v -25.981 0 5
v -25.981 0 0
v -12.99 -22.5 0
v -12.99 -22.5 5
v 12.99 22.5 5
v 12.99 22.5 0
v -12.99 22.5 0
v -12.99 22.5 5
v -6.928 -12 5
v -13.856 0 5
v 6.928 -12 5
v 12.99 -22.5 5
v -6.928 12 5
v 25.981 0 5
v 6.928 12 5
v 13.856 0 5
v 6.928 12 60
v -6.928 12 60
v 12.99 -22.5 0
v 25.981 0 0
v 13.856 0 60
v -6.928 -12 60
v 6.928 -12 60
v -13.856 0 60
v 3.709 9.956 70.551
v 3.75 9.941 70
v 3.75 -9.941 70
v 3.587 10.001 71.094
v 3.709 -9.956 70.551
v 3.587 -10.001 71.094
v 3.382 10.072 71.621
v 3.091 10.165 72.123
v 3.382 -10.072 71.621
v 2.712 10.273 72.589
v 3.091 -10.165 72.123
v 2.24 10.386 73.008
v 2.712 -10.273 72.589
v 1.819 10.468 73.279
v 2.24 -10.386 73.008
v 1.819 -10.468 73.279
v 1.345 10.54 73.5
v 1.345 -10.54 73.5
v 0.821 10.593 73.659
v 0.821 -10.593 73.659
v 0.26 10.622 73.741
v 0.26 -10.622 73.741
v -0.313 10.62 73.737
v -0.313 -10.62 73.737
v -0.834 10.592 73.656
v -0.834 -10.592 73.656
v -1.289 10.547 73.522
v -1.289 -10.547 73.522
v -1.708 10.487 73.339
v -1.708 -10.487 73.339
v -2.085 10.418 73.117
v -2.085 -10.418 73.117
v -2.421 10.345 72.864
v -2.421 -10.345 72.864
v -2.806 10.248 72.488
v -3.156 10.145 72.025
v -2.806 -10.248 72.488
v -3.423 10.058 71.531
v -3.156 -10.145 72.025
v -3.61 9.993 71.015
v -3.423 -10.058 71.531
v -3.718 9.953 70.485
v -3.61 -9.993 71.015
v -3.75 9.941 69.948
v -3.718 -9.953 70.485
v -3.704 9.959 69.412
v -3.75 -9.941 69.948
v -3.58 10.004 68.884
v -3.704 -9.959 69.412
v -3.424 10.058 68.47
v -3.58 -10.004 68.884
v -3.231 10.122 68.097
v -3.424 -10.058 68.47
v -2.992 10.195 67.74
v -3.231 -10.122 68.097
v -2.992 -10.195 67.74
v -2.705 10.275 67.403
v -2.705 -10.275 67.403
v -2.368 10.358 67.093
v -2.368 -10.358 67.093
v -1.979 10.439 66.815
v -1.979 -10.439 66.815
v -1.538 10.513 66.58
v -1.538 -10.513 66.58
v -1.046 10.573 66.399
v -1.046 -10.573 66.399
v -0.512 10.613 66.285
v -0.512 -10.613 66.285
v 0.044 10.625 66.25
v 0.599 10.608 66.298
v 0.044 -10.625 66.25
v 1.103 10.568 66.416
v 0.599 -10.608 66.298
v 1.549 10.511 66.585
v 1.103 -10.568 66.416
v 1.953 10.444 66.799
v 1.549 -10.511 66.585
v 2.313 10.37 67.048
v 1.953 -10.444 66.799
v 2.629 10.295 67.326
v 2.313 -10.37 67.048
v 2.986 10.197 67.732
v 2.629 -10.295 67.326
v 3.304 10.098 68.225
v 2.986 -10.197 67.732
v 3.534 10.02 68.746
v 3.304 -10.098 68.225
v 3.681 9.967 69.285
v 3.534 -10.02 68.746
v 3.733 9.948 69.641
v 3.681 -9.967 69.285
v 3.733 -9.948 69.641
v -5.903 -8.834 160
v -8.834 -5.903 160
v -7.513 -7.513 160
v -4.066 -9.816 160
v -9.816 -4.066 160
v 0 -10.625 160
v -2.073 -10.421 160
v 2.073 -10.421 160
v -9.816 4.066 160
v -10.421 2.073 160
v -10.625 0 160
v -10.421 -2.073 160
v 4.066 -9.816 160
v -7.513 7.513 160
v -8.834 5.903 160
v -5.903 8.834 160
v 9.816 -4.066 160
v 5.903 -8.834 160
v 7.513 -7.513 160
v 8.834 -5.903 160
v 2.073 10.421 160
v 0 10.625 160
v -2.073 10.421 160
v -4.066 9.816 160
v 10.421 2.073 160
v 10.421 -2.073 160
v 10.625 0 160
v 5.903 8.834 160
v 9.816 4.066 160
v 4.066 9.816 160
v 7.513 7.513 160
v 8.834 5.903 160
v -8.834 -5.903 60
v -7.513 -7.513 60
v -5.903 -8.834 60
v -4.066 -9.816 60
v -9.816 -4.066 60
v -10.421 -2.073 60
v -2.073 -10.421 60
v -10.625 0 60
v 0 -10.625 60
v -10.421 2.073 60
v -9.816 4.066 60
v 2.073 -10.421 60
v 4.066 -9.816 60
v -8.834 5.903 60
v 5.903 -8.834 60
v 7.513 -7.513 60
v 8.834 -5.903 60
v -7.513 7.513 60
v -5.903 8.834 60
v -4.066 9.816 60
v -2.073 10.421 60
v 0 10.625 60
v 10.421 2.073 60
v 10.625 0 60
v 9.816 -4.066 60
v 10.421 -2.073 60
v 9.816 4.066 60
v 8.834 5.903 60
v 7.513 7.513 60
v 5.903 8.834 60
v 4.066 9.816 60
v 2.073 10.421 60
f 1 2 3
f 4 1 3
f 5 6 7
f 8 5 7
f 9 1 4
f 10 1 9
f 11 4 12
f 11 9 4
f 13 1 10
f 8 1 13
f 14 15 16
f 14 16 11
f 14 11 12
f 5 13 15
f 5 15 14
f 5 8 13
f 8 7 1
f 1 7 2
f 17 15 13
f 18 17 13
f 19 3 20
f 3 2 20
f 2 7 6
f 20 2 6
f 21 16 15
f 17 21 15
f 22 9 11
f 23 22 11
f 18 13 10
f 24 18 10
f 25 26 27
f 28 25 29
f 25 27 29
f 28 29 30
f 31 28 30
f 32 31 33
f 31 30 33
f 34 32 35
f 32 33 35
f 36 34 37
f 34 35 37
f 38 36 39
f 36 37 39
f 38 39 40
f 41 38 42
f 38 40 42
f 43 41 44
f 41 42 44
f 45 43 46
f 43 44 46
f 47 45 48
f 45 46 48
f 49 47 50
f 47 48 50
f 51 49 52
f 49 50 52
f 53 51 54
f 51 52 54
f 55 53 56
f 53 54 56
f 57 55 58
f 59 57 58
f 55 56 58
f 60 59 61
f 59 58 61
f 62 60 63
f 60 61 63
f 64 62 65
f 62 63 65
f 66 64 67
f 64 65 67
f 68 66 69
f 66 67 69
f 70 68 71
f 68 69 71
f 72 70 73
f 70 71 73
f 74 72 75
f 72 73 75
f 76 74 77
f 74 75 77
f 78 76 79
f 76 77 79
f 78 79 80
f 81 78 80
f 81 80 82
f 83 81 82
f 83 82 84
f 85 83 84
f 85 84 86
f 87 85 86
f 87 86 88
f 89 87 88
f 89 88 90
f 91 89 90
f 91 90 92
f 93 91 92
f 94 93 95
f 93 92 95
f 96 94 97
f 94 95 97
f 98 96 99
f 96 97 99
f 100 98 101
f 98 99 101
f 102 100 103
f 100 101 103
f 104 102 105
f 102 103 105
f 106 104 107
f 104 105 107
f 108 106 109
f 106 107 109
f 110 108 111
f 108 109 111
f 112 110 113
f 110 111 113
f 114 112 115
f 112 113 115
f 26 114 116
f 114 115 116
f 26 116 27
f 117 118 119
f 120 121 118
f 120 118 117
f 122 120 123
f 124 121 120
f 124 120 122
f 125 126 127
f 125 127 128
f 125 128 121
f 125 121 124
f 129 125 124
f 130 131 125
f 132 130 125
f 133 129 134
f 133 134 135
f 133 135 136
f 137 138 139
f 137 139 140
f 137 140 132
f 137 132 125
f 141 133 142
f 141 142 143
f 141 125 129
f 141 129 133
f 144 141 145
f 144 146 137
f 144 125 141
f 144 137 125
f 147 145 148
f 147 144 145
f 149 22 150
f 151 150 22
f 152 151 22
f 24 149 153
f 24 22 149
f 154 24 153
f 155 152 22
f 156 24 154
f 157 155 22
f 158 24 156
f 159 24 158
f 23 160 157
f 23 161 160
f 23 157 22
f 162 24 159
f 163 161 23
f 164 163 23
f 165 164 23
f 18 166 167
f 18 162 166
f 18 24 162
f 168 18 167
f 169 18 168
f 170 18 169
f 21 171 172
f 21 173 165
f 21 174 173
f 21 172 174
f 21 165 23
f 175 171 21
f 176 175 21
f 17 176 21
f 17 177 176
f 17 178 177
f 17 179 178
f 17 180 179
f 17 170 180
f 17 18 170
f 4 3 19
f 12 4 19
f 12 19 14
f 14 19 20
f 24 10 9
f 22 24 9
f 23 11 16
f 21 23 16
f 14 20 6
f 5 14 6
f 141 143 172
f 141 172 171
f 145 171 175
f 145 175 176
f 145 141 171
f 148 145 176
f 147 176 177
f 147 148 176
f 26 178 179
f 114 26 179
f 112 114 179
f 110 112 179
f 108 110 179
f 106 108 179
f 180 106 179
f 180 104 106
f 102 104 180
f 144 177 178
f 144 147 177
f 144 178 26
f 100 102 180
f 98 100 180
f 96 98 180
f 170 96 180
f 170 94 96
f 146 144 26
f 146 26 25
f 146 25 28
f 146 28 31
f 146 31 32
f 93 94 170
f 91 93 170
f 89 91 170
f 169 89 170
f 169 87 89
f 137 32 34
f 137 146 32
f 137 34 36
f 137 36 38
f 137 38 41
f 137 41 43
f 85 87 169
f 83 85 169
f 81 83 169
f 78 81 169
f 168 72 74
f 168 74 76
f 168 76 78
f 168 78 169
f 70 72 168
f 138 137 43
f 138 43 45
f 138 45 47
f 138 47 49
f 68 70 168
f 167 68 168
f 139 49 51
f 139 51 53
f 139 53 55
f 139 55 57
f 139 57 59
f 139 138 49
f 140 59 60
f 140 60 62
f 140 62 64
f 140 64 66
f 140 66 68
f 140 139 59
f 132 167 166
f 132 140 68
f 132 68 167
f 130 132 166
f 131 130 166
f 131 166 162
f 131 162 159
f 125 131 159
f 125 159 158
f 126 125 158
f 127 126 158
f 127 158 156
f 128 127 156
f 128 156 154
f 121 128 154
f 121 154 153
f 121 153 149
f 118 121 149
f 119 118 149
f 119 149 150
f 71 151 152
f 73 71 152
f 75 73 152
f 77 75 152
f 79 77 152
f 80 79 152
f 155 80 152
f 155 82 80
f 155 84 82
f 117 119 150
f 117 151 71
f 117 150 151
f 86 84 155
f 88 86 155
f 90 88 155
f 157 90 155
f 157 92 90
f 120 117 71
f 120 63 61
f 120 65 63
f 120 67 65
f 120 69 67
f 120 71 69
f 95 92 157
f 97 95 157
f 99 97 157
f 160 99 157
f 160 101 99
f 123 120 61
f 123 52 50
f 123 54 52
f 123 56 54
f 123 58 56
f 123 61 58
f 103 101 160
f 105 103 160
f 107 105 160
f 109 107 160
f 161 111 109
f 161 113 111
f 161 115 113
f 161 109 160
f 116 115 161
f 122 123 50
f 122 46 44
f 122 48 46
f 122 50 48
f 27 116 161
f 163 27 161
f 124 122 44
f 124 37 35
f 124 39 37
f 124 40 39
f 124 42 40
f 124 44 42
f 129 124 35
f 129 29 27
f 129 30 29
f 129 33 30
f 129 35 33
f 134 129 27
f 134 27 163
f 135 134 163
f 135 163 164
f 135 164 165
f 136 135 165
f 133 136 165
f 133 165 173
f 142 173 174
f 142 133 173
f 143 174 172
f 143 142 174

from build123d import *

# Parameters (mm, degrees)
F1_DEPTH = 160
F3_DEPTH = 5
F4_R     = 10.625
F5_DEPTH = 100
F6_R     = 3.75
F7_DEPTH = 50


with BuildPart() as f1:
    # F0 (on Top) → F1 (new body)
    with BuildSketch(Plane.XY):
        Polygon((6.928203, 12), (-6.928203, 12), (-13.856406, 0), (-6.928203, -12), (6.928203, -12), (13.856406, 0), align=None)
    extrude(amount=F1_DEPTH)

    # F2 (on Top) → F3 (join)
    with BuildSketch(Plane.XY):
        Polygon((-12.990381, -22.5), (12.990381, -22.5), (25.980762, 0), (12.990381, 22.5), (-12.990381, 22.5), (-25.980762, 0), align=None)
    extrude(amount=F3_DEPTH)

    # F4 (on face) → F5 (cut)
    with BuildSketch(Plane.XY.offset(160)):
        Polygon((6.928203, 12), (-6.928203, 12), (-13.856406, 0), (-6.928203, -12), (6.928203, -12), (13.856406, 0), align=None)
        Circle(F4_R, mode=Mode.SUBTRACT)
    extrude(amount=-F5_DEPTH, mode=Mode.SUBTRACT)

    # F6 (on Front) → F7 (cut, symmetric)
    with BuildSketch(Plane.XZ):
        with Locations((0, 70)):
            Circle(F6_R)
    extrude(amount=F7_DEPTH, both=True, mode=Mode.SUBTRACT)


solid = f1.part
